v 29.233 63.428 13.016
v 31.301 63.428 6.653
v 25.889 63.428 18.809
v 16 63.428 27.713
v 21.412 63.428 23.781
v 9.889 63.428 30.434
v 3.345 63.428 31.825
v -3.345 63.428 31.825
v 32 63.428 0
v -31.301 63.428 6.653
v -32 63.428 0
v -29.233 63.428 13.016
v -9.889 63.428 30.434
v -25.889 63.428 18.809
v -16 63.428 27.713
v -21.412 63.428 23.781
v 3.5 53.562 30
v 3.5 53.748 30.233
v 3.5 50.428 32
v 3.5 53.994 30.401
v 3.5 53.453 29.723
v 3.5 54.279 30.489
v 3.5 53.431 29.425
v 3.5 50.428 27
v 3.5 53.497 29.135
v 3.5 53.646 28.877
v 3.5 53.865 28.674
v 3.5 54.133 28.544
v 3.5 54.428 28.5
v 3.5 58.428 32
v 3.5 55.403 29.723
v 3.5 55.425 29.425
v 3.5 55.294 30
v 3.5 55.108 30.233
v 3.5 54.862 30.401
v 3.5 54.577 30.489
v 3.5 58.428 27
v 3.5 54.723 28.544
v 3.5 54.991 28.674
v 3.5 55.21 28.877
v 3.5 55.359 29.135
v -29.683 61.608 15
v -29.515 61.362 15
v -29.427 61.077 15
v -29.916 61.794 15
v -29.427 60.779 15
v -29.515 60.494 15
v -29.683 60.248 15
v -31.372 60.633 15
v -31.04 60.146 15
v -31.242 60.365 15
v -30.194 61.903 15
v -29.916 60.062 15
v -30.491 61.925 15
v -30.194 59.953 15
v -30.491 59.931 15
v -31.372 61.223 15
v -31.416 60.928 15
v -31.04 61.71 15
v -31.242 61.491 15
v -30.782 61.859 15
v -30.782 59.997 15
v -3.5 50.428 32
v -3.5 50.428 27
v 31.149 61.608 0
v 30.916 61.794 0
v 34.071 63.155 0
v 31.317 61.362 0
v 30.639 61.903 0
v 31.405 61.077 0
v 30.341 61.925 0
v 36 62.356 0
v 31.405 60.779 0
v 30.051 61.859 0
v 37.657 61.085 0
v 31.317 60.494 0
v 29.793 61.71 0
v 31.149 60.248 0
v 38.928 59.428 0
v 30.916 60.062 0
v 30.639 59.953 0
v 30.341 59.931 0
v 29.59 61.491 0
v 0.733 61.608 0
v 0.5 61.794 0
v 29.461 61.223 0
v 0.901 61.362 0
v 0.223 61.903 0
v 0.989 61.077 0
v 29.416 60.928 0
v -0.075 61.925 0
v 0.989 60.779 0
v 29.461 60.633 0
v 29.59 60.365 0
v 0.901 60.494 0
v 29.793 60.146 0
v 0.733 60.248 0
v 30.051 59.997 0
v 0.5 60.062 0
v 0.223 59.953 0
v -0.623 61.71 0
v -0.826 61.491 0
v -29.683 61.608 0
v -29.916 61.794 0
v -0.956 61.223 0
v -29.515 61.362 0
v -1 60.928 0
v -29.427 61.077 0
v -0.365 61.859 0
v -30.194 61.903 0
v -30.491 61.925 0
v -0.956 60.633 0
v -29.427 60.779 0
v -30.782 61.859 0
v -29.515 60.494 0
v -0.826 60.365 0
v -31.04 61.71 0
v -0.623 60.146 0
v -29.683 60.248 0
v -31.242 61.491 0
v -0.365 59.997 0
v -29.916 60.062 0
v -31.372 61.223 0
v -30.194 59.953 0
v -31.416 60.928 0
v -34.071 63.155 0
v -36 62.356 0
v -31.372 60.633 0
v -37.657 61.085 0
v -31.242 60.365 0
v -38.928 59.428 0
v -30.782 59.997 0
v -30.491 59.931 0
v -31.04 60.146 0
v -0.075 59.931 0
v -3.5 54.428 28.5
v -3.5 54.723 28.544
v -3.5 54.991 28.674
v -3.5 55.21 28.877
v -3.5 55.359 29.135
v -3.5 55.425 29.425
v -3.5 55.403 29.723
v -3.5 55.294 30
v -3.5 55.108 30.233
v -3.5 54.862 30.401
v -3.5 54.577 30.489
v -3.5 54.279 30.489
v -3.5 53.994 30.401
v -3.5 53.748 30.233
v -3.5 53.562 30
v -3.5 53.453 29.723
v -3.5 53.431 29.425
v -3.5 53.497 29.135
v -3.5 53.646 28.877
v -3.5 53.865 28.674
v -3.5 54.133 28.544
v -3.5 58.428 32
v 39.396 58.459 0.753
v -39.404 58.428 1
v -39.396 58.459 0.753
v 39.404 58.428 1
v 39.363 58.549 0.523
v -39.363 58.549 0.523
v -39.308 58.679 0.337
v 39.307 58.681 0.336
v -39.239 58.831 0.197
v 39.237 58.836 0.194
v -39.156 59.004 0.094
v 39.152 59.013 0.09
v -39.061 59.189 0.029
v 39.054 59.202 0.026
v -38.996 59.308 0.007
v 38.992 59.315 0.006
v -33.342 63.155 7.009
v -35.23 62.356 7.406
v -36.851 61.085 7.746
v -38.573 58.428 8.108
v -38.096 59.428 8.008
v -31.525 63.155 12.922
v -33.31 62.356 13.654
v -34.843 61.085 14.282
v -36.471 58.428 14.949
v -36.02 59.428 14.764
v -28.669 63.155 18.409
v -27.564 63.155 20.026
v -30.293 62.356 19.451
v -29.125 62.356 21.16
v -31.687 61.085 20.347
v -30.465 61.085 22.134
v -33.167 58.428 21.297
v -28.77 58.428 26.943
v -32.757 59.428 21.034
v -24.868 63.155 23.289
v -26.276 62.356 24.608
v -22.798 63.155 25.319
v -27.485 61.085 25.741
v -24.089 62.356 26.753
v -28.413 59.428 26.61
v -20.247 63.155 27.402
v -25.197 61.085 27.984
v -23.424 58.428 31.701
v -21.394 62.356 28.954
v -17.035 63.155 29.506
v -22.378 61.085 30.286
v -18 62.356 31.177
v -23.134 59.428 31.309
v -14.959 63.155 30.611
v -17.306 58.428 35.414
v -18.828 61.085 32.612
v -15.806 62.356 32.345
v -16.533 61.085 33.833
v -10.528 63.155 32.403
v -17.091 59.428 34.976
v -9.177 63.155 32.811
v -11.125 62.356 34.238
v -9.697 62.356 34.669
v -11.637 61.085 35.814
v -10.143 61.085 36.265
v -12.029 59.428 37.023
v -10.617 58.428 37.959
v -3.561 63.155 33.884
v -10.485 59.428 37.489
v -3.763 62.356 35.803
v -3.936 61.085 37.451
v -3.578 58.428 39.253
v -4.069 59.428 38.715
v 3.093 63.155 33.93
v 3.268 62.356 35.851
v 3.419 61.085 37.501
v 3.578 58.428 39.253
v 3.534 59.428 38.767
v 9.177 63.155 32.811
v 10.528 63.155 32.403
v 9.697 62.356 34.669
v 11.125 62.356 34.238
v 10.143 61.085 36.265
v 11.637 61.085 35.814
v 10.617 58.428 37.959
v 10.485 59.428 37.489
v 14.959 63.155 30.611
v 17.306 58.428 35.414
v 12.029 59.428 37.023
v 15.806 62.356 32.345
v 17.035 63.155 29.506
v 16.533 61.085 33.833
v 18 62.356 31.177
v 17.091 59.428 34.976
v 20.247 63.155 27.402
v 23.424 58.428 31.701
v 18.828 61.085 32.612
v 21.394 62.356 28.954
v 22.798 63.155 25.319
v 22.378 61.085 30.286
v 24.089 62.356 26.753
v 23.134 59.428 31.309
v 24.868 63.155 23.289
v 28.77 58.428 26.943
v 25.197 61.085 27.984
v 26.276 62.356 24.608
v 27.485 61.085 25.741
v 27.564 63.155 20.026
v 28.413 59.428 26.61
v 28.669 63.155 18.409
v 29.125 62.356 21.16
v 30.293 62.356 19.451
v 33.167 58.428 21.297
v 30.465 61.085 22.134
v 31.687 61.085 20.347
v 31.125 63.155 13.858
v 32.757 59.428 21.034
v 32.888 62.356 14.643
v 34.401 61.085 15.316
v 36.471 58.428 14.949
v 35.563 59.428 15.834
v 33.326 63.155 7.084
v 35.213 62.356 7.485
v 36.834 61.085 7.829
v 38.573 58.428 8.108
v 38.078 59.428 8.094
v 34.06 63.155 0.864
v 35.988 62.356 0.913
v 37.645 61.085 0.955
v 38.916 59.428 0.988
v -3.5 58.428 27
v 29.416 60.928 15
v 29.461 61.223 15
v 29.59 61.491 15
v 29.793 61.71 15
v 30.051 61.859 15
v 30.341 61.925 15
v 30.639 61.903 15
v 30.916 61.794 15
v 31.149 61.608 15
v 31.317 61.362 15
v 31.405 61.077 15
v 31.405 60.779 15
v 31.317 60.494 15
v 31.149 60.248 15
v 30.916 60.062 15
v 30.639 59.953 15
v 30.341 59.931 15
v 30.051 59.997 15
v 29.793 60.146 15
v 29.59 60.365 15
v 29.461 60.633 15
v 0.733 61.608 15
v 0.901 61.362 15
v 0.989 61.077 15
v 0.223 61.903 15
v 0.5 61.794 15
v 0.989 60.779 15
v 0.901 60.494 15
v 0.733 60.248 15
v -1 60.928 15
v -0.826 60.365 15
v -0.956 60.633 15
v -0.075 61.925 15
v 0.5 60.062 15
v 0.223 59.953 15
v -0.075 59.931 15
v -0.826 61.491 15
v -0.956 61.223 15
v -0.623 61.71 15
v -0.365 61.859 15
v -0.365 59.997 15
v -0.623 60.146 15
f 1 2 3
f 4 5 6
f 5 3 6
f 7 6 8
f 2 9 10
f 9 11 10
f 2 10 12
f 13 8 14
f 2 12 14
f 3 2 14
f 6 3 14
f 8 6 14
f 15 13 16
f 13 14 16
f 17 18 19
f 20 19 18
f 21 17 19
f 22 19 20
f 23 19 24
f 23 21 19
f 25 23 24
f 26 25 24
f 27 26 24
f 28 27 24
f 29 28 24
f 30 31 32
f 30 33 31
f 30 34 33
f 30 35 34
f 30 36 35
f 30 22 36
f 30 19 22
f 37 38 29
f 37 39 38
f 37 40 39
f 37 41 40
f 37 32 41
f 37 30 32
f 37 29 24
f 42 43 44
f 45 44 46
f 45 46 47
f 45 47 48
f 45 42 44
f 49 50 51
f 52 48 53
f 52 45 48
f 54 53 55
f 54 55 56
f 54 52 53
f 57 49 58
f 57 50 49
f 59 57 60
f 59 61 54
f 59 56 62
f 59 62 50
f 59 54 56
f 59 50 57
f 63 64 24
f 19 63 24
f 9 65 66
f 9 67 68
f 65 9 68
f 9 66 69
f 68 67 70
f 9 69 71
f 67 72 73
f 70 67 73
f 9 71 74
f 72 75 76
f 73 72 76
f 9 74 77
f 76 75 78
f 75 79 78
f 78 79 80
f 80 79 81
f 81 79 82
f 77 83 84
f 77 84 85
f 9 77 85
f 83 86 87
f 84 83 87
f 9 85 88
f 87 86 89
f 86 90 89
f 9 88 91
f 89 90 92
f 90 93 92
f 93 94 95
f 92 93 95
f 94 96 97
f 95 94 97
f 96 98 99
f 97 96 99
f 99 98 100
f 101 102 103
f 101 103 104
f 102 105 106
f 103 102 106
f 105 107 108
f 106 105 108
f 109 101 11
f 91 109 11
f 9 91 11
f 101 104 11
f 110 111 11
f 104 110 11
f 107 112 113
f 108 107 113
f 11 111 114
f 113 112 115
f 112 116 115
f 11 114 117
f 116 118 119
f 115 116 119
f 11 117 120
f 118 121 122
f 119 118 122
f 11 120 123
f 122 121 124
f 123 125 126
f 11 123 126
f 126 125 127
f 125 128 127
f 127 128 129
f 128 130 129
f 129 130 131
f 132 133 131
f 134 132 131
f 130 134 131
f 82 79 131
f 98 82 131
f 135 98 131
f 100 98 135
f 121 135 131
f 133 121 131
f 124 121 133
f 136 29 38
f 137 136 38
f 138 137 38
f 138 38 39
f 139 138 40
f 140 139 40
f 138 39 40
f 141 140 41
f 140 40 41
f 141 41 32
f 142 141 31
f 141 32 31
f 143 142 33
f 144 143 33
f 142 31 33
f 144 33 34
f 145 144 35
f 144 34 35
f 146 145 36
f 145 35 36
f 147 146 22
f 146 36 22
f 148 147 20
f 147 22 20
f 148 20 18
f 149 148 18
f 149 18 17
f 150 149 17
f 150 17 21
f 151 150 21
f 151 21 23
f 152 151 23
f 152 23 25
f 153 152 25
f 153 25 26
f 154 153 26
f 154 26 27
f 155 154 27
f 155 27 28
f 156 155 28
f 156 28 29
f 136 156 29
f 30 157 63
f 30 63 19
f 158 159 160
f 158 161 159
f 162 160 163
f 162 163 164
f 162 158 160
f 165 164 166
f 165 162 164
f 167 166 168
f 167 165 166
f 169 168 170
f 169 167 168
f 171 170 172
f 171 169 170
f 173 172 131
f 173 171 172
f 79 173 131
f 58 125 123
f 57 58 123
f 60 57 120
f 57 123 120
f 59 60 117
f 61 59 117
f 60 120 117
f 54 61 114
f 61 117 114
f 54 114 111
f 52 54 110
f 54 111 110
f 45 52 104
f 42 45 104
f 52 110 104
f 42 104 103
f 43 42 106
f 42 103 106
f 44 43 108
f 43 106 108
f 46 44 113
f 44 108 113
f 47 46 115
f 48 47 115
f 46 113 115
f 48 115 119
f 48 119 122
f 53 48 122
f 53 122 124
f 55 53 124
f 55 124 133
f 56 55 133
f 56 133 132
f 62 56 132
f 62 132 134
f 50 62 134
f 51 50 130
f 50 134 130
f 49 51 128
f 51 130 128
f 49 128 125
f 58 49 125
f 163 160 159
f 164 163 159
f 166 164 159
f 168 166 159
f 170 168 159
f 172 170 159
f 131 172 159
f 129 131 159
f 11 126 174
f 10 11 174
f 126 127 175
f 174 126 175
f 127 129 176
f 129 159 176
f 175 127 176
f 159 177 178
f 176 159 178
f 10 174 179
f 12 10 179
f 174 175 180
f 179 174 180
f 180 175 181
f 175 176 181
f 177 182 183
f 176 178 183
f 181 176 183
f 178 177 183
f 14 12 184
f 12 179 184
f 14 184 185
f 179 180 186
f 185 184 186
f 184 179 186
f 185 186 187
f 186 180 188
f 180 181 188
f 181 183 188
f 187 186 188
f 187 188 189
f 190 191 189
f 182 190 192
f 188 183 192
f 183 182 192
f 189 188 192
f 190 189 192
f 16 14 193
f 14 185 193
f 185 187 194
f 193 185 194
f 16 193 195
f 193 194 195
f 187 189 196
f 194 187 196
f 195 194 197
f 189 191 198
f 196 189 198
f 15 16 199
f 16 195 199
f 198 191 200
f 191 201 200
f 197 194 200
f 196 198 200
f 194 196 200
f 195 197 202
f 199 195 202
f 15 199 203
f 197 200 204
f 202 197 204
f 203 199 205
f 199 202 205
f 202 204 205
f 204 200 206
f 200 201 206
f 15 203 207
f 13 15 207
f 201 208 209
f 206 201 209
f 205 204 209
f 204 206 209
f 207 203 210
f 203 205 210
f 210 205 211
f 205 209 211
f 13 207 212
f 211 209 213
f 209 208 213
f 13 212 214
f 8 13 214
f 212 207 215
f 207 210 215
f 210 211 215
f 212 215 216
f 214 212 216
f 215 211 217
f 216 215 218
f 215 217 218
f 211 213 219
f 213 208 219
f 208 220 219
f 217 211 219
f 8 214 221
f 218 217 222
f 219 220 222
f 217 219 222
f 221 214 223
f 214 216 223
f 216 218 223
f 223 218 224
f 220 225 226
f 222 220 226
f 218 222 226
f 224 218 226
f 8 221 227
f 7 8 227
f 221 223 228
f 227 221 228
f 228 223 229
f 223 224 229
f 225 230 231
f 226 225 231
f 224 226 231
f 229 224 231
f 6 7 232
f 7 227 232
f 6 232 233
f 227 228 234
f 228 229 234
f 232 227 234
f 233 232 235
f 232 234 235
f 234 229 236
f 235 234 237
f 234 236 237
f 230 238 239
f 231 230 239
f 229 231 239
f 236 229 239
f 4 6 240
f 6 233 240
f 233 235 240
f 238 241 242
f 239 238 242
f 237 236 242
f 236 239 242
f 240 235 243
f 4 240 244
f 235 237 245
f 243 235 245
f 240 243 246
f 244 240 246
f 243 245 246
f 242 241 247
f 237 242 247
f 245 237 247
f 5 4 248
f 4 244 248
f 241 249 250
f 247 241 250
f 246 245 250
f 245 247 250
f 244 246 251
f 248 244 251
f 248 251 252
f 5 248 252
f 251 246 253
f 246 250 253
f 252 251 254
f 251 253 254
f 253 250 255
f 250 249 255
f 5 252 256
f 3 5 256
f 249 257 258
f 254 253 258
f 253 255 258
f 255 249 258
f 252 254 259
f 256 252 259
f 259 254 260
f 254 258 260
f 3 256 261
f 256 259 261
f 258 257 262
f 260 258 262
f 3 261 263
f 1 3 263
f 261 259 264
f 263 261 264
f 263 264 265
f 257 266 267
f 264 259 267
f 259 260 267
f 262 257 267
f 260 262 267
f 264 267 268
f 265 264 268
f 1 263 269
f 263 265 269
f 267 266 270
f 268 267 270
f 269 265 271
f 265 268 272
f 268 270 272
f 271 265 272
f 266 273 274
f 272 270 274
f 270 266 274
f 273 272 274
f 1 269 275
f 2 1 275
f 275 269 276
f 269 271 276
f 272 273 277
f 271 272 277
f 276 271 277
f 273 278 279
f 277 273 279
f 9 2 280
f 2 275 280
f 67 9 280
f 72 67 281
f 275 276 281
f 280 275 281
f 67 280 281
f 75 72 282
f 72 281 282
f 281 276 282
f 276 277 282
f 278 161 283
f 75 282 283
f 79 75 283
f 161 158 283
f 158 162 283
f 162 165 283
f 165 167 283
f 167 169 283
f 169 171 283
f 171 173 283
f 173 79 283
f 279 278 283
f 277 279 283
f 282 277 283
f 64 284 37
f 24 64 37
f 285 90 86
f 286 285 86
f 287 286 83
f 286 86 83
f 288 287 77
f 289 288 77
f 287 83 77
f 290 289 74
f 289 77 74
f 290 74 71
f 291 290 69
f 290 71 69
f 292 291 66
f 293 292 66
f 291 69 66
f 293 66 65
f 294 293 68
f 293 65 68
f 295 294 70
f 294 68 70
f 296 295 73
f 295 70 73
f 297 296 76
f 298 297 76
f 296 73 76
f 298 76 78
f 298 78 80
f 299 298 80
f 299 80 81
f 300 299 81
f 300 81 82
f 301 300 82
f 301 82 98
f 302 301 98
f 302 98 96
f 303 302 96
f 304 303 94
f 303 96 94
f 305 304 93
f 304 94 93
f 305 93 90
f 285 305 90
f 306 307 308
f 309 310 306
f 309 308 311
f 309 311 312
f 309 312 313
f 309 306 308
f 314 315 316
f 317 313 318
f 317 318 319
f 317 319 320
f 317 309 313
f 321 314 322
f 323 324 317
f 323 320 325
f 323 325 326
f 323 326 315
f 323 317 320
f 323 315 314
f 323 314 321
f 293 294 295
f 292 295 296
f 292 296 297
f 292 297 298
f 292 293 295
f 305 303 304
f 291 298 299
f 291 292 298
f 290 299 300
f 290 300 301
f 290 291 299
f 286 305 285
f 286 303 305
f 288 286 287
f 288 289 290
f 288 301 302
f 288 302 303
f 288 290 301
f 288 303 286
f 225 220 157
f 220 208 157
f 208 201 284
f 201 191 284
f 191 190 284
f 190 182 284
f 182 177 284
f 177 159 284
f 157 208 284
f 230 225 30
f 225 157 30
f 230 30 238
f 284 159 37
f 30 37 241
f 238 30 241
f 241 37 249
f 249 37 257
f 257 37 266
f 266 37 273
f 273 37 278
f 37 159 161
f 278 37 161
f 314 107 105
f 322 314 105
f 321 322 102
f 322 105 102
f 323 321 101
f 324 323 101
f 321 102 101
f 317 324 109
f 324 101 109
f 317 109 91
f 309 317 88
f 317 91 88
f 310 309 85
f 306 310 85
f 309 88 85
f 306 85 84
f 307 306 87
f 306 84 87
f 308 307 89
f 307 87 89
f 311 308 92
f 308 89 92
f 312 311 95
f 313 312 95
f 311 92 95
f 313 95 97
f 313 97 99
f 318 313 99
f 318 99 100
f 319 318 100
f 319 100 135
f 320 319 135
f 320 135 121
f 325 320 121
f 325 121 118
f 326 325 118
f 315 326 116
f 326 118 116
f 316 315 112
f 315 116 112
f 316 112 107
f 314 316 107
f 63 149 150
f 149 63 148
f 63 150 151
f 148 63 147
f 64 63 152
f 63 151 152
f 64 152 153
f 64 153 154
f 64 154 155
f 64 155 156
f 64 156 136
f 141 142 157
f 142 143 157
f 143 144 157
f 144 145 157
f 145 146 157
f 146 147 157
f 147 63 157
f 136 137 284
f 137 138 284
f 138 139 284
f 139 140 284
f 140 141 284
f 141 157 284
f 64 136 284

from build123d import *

# Parameters (mm, degrees)
CUT_EXTRUDE3_DEPTH           = 60
CUT_EXTRUDE5_DEPTH           = 2
CUT_EXTRUDE5_DEPTH_BACK      = 30
SKETCH9_R                    = 38
SKETCH9_R_2                  = 23
SKETCH19_W                   = 12
SKETCH19_H                   = 36.5
CUT_REVOLVE2_ANGLE           = 65
CUT_REVOLVE2_OTHER_WAY_ANGLE = 65
SKETCH21_W                   = 3.25
SKETCH21_H                   = 4
BOSS_EXTRUDE3_DEPTH          = 1.35
CIRPATTERN1_COUNT            = 5
CUT_EXTRUDE9_START           = -5
CUT_EXTRUDE9_DEPTH           = 5
SKETCH23_R                   = 10.5
CUT_EXTRUDE10_DEPTH          = 10
SKETCH24_W                   = 15
SKETCH24_H                   = 8
BOSS_EXTRUDE4_DEPTH          = 8
SKETCH26_W                   = 10
SKETCH26_H                   = 6
CUT_EXTRUDE11_DEPTH          = 10
SKETCH27_W                   = 4
SKETCH27_H                   = 5
CUT_EXTRUDE12_DEPTH          = 5
CUT_EXTRUDE14_DEPTH          = 2
CUT_EXTRUDE14_DEPTH_BACK     = 30
SKETCH29_R                   = 1
CUT_EXTRUDE15_DEPTH          = 15
FILLET1_R                    = 6
FILLET2_R                    = 8
INTERSECT1_DEPTH             = 58.427876097
SKETCH31_W                   = 7
SKETCH31_H                   = 5
BOSS_EXTRUDE7_DEPTH          = 8
SKETCH32_R                   = 1
CUT_EXTRUDE16_DEPTH          = 7.5
FILLET3_R                    = 1


# Read off the part's stored shape, not the designer's step: Cut-Extrude9, Intersect1
with BuildPart() as part:
    # Sketch1 → Revolve1 (revolve)
    with BuildSketch(Plane.XY, mode=Mode.PRIVATE) as revolve1_sk:
        with BuildLine():
            Line((0, 63.427876097), (32, 63.427876097))
            ThreePointArc((32, 63.427876097), (37.656854249, 61.084730346), (40, 55.427876097))
            Line((40, 55.427876097), (40, 28.846818009))
            ThreePointArc((40, 28.846818009), (38.792081772, 24.082439968), (35.460140376, 20.469057744))
            Line((35.460140376, 20.469057744), (28.539859624, 15.958818353))
            ThreePointArc((28.539859624, 15.958818353), (25.207918228, 12.345436129), (24, 7.581058088))
            Line((24, 7.581058088), (24, 3.25))
            Line((24, 3.25), (24.35, 3))
            Line((24.35, 3), (24.35, 0))
            Line((24.35, 0), (22.5, 0))
            Line((22.5, 0), (22.5, 12.5))
            ThreePointArc((22.5, 12.5), (22.353553391, 12.853553391), (22, 13))
            Line((22, 13), (0, 13))
            Line((0, 13), (0, 63.427876097))
        make_face()
    revolve(revolve1_sk.sketch.rotate(Axis((0, 0, 0), (0, 1, 0)), 90), axis=Axis((0, 0, 0), (0, 1, 0)))

    # Sketch11 → Cut-Extrude3 (cut)
    with BuildSketch(Plane(origin=(0, 13, 0), x_dir=(-1, 0, 0), z_dir=(0, -1, 0))):
        with BuildLine():
            Line((-21, 0), (21, 0))
            ThreePointArc((21, 0), (0, 21), (-21, 0))
        make_face()
    extrude(amount=-CUT_EXTRUDE3_DEPTH, mode=Mode.SUBTRACT)

    # Sketch9 → Cut-Extrude5 (cut, two sides: drawn at the far end of the back side and taken through both)
    with BuildSketch(Plane(origin=(0, 55.427876097, 0), x_dir=(1, 0, 0), z_dir=(0, 1, 0)).offset(-CUT_EXTRUDE5_DEPTH_BACK)):
        with Locations(Location((0, 0, 0), (0, 0, 270))):
            Circle(SKETCH9_R)
        with Locations(Location((0, 0, 0), (0, 0, 270))):
            Circle(SKETCH9_R_2, mode=Mode.SUBTRACT)
    extrude(amount=CUT_EXTRUDE5_DEPTH + CUT_EXTRUDE5_DEPTH_BACK, mode=Mode.SUBTRACT)

    # Sketch19 → Cut-Revolve2 (revolve, cut)
    with BuildSketch(Plane(origin=(0, 0, 0), x_dir=(0, 0, -1), z_dir=(1, 0, 0))):
        with Locations((-41.064715832, 37.177876097)):
            Rectangle(SKETCH19_W, SKETCH19_H)
    revolve(axis=Axis((0, 0, 0), (0, 1, 0)), revolution_arc=CUT_REVOLVE2_ANGLE, mode=Mode.SUBTRACT)

    # Sketch19 → Cut-Revolve2 other way (revolve, cut)
    with BuildSketch(Plane(origin=(0, 0, 0), x_dir=(0, 0, -1), z_dir=(1, 0, 0))):
        with Locations((-41.064715832, 37.177876097)):
            Rectangle(SKETCH19_W, SKETCH19_H)
    revolve(axis=Axis((0, 0, 0), (0, -1, 0)), revolution_arc=CUT_REVOLVE2_OTHER_WAY_ANGLE, mode=Mode.SUBTRACT)

    # Sketch21 → Boss-Extrude3 (add)
    with BuildSketch(Plane(origin=(0, 0, 22.5), x_dir=(-1, 0, 0), z_dir=(0, 0, -1))):
        with Locations((0, 2)):
            Rectangle(SKETCH21_W, SKETCH21_H)
    boss_extrude3 = extrude(amount=BOSS_EXTRUDE3_DEPTH)

    # CirPattern1: Boss-Extrude3 ×5 about axis
    cirpattern1_axis = Axis((0, 0, 0), (0, 1, 0))
    for i in range(1, CIRPATTERN1_COUNT):
        add(boss_extrude3.rotate(cirpattern1_axis, i * 360 / CIRPATTERN1_COUNT))

    # Cut-Extrude9 outline → Cut-Extrude9 (cut)
    with BuildSketch(Plane(origin=(0, 63.427876097, 0), x_dir=(1, 0, 0), z_dir=(0, 1, 0)).offset(CUT_EXTRUDE9_START)):
        with BuildLine():
            ThreePointArc((40, 0), (0, 40), (-40, 0))
            Line((-40, 0), (-21, 0))
            ThreePointArc((-21, 0), (0, 21), (21, 0))
            Line((21, 0), (40, 0))
        make_face()
    extrude(amount=CUT_EXTRUDE9_DEPTH, mode=Mode.SUBTRACT)

    # Sketch23 → Cut-Extrude10 (cut)
    with BuildSketch(Plane(origin=(0, 0, -40), x_dir=(-1, 0, 0), z_dir=(0, 0, -1))):
        with Locations((0, 42.137876097)):
            Circle(SKETCH23_R)
    extrude(amount=-CUT_EXTRUDE10_DEPTH, mode=Mode.SUBTRACT)

    # Sketch24 → Boss-Extrude4 (add)
    with BuildSketch(Plane(origin=(0, 58.427876097, 0), x_dir=(1, 0, 0), z_dir=(0, 1, 0))):
        with Locations((0, 30)):
            Rectangle(SKETCH24_W, SKETCH24_H)
    extrude(amount=-BOSS_EXTRUDE4_DEPTH)

    # Sketch26 → Cut-Extrude11 (cut)
    with BuildSketch(Plane(origin=(0, 58.427876097, 0), x_dir=(1, 0, 0), z_dir=(0, 1, 0))):
        with Locations((0, 30)):
            Rectangle(SKETCH26_W, SKETCH26_H)
    extrude(amount=-CUT_EXTRUDE11_DEPTH, mode=Mode.SUBTRACT)

    # Sketch27 → Cut-Extrude12 (cut)
    with BuildSketch(Plane(origin=(7.5, 0, 0), x_dir=(0, 0, -1), z_dir=(1, 0, 0))):
        with Locations((30, 53.927876097)):
            Rectangle(SKETCH27_W, SKETCH27_H)
    extrude(amount=-CUT_EXTRUDE12_DEPTH, mode=Mode.SUBTRACT)

    # Sketch28 → Cut-Extrude14 (cut, two sides: drawn at the far end of the back side and taken through both)
    with BuildSketch(Plane(origin=(0, 55.427876097, 0), x_dir=(1, 0, 0), z_dir=(0, 1, 0)).offset(-CUT_EXTRUDE14_DEPTH_BACK)):
        with BuildLine():
            Line((-22.912878475, -2), (22.912878475, -2))
            ThreePointArc((22.912878475, -2), (0, -23), (-22.912878475, -2))
        make_face()
    extrude(amount=CUT_EXTRUDE14_DEPTH + CUT_EXTRUDE14_DEPTH_BACK, mode=Mode.SUBTRACT)

    # Sketch29 → Cut-Extrude15 (cut)
    with BuildSketch(Plane(origin=(0, 0, 0), x_dir=(-1, 0, 0), z_dir=(0, 0, -1))):
        with Locations((-30.416198487, 60.927876097)):
            Circle(SKETCH29_R)
        with Locations((30.416198487, 60.927876097)):
            Circle(SKETCH29_R)
        with Locations((0, 60.927876097)):
            Circle(SKETCH29_R)
    extrude(amount=-CUT_EXTRUDE15_DEPTH, mode=Mode.SUBTRACT)

    # Fillet1
    fillet1_edges = [part.edges().sort_by_distance(p)[0] for p in [
        (21, 35.713938048, 0),
        (-21, 35.713938048, 0),
    ]]
    fillet(fillet1_edges, radius=FILLET1_R)

    # Fillet2
    fillet2_edges = [part.edges().sort_by_distance(p)[0] for p in [
        (-22.912878475, 41.427876097, 2),
        (22.912878475, 41.427876097, 2),
    ]]
    fillet(fillet2_edges, radius=FILLET2_R)

    # Intersect1 outline → Intersect1 (cut)
    with BuildSketch(Plane(origin=(0, 0, 0), x_dir=(1, 0, 0), z_dir=(0, 1, 0))):
        with BuildLine():
            Line((-37.508702776, -13.895942431), (-42, -15.355253362))
            Line((-42, -15.355253362), (-42, -41))
            Line((-42, -41), (42, -41))
            Line((42, -41), (42, -15.355253362))
            Line((42, -15.355253362), (37.508702776, -13.895942431))
            ThreePointArc((37.508702776, -13.895942431), (0, 40), (-37.508702776, -13.895942431))
        make_face()
        with BuildLine():
            ThreePointArc((19.246817919, 8.4), (18.767687244, 2.713664655), (13.747727085, 0))
            Line((13.747727085, 0), (-13.747727085, 0))
            ThreePointArc((-13.747727085, 0), (-18.767687244, 2.713664655), (-19.246817919, 8.4))
            ThreePointArc((-19.246817919, 8.4), (0, 21), (19.246817919, 8.4))
        make_face(mode=Mode.SUBTRACT)
    extrude(amount=INTERSECT1_DEPTH, mode=Mode.SUBTRACT)

    # Sketch31 → Boss-Extrude7 (add)
    with BuildSketch(Plane(origin=(0, 58.427876097, 0), x_dir=(1, 0, 0), z_dir=(0, 1, 0))):
        with Locations((0, -29.5)):
            Rectangle(SKETCH31_W, SKETCH31_H)
    extrude(amount=-BOSS_EXTRUDE7_DEPTH)

    # Sketch32 → Cut-Extrude16 (cut)
    with BuildSketch(Plane(origin=(3.5, 0, 0), x_dir=(0, 0, -1), z_dir=(1, 0, 0))):
        with Locations((-29.5, 54.427876097)):
            Circle(SKETCH32_R)
    extrude(amount=-CUT_EXTRUDE16_DEPTH, mode=Mode.SUBTRACT)

    # Fillet3
    fillet3_edges = [part.edges().sort_by_distance(p)[0] for p in [
        (0, 58.427876097, 0),
    ]]
    fillet(fillet3_edges, radius=FILLET3_R)


solid = part.part
